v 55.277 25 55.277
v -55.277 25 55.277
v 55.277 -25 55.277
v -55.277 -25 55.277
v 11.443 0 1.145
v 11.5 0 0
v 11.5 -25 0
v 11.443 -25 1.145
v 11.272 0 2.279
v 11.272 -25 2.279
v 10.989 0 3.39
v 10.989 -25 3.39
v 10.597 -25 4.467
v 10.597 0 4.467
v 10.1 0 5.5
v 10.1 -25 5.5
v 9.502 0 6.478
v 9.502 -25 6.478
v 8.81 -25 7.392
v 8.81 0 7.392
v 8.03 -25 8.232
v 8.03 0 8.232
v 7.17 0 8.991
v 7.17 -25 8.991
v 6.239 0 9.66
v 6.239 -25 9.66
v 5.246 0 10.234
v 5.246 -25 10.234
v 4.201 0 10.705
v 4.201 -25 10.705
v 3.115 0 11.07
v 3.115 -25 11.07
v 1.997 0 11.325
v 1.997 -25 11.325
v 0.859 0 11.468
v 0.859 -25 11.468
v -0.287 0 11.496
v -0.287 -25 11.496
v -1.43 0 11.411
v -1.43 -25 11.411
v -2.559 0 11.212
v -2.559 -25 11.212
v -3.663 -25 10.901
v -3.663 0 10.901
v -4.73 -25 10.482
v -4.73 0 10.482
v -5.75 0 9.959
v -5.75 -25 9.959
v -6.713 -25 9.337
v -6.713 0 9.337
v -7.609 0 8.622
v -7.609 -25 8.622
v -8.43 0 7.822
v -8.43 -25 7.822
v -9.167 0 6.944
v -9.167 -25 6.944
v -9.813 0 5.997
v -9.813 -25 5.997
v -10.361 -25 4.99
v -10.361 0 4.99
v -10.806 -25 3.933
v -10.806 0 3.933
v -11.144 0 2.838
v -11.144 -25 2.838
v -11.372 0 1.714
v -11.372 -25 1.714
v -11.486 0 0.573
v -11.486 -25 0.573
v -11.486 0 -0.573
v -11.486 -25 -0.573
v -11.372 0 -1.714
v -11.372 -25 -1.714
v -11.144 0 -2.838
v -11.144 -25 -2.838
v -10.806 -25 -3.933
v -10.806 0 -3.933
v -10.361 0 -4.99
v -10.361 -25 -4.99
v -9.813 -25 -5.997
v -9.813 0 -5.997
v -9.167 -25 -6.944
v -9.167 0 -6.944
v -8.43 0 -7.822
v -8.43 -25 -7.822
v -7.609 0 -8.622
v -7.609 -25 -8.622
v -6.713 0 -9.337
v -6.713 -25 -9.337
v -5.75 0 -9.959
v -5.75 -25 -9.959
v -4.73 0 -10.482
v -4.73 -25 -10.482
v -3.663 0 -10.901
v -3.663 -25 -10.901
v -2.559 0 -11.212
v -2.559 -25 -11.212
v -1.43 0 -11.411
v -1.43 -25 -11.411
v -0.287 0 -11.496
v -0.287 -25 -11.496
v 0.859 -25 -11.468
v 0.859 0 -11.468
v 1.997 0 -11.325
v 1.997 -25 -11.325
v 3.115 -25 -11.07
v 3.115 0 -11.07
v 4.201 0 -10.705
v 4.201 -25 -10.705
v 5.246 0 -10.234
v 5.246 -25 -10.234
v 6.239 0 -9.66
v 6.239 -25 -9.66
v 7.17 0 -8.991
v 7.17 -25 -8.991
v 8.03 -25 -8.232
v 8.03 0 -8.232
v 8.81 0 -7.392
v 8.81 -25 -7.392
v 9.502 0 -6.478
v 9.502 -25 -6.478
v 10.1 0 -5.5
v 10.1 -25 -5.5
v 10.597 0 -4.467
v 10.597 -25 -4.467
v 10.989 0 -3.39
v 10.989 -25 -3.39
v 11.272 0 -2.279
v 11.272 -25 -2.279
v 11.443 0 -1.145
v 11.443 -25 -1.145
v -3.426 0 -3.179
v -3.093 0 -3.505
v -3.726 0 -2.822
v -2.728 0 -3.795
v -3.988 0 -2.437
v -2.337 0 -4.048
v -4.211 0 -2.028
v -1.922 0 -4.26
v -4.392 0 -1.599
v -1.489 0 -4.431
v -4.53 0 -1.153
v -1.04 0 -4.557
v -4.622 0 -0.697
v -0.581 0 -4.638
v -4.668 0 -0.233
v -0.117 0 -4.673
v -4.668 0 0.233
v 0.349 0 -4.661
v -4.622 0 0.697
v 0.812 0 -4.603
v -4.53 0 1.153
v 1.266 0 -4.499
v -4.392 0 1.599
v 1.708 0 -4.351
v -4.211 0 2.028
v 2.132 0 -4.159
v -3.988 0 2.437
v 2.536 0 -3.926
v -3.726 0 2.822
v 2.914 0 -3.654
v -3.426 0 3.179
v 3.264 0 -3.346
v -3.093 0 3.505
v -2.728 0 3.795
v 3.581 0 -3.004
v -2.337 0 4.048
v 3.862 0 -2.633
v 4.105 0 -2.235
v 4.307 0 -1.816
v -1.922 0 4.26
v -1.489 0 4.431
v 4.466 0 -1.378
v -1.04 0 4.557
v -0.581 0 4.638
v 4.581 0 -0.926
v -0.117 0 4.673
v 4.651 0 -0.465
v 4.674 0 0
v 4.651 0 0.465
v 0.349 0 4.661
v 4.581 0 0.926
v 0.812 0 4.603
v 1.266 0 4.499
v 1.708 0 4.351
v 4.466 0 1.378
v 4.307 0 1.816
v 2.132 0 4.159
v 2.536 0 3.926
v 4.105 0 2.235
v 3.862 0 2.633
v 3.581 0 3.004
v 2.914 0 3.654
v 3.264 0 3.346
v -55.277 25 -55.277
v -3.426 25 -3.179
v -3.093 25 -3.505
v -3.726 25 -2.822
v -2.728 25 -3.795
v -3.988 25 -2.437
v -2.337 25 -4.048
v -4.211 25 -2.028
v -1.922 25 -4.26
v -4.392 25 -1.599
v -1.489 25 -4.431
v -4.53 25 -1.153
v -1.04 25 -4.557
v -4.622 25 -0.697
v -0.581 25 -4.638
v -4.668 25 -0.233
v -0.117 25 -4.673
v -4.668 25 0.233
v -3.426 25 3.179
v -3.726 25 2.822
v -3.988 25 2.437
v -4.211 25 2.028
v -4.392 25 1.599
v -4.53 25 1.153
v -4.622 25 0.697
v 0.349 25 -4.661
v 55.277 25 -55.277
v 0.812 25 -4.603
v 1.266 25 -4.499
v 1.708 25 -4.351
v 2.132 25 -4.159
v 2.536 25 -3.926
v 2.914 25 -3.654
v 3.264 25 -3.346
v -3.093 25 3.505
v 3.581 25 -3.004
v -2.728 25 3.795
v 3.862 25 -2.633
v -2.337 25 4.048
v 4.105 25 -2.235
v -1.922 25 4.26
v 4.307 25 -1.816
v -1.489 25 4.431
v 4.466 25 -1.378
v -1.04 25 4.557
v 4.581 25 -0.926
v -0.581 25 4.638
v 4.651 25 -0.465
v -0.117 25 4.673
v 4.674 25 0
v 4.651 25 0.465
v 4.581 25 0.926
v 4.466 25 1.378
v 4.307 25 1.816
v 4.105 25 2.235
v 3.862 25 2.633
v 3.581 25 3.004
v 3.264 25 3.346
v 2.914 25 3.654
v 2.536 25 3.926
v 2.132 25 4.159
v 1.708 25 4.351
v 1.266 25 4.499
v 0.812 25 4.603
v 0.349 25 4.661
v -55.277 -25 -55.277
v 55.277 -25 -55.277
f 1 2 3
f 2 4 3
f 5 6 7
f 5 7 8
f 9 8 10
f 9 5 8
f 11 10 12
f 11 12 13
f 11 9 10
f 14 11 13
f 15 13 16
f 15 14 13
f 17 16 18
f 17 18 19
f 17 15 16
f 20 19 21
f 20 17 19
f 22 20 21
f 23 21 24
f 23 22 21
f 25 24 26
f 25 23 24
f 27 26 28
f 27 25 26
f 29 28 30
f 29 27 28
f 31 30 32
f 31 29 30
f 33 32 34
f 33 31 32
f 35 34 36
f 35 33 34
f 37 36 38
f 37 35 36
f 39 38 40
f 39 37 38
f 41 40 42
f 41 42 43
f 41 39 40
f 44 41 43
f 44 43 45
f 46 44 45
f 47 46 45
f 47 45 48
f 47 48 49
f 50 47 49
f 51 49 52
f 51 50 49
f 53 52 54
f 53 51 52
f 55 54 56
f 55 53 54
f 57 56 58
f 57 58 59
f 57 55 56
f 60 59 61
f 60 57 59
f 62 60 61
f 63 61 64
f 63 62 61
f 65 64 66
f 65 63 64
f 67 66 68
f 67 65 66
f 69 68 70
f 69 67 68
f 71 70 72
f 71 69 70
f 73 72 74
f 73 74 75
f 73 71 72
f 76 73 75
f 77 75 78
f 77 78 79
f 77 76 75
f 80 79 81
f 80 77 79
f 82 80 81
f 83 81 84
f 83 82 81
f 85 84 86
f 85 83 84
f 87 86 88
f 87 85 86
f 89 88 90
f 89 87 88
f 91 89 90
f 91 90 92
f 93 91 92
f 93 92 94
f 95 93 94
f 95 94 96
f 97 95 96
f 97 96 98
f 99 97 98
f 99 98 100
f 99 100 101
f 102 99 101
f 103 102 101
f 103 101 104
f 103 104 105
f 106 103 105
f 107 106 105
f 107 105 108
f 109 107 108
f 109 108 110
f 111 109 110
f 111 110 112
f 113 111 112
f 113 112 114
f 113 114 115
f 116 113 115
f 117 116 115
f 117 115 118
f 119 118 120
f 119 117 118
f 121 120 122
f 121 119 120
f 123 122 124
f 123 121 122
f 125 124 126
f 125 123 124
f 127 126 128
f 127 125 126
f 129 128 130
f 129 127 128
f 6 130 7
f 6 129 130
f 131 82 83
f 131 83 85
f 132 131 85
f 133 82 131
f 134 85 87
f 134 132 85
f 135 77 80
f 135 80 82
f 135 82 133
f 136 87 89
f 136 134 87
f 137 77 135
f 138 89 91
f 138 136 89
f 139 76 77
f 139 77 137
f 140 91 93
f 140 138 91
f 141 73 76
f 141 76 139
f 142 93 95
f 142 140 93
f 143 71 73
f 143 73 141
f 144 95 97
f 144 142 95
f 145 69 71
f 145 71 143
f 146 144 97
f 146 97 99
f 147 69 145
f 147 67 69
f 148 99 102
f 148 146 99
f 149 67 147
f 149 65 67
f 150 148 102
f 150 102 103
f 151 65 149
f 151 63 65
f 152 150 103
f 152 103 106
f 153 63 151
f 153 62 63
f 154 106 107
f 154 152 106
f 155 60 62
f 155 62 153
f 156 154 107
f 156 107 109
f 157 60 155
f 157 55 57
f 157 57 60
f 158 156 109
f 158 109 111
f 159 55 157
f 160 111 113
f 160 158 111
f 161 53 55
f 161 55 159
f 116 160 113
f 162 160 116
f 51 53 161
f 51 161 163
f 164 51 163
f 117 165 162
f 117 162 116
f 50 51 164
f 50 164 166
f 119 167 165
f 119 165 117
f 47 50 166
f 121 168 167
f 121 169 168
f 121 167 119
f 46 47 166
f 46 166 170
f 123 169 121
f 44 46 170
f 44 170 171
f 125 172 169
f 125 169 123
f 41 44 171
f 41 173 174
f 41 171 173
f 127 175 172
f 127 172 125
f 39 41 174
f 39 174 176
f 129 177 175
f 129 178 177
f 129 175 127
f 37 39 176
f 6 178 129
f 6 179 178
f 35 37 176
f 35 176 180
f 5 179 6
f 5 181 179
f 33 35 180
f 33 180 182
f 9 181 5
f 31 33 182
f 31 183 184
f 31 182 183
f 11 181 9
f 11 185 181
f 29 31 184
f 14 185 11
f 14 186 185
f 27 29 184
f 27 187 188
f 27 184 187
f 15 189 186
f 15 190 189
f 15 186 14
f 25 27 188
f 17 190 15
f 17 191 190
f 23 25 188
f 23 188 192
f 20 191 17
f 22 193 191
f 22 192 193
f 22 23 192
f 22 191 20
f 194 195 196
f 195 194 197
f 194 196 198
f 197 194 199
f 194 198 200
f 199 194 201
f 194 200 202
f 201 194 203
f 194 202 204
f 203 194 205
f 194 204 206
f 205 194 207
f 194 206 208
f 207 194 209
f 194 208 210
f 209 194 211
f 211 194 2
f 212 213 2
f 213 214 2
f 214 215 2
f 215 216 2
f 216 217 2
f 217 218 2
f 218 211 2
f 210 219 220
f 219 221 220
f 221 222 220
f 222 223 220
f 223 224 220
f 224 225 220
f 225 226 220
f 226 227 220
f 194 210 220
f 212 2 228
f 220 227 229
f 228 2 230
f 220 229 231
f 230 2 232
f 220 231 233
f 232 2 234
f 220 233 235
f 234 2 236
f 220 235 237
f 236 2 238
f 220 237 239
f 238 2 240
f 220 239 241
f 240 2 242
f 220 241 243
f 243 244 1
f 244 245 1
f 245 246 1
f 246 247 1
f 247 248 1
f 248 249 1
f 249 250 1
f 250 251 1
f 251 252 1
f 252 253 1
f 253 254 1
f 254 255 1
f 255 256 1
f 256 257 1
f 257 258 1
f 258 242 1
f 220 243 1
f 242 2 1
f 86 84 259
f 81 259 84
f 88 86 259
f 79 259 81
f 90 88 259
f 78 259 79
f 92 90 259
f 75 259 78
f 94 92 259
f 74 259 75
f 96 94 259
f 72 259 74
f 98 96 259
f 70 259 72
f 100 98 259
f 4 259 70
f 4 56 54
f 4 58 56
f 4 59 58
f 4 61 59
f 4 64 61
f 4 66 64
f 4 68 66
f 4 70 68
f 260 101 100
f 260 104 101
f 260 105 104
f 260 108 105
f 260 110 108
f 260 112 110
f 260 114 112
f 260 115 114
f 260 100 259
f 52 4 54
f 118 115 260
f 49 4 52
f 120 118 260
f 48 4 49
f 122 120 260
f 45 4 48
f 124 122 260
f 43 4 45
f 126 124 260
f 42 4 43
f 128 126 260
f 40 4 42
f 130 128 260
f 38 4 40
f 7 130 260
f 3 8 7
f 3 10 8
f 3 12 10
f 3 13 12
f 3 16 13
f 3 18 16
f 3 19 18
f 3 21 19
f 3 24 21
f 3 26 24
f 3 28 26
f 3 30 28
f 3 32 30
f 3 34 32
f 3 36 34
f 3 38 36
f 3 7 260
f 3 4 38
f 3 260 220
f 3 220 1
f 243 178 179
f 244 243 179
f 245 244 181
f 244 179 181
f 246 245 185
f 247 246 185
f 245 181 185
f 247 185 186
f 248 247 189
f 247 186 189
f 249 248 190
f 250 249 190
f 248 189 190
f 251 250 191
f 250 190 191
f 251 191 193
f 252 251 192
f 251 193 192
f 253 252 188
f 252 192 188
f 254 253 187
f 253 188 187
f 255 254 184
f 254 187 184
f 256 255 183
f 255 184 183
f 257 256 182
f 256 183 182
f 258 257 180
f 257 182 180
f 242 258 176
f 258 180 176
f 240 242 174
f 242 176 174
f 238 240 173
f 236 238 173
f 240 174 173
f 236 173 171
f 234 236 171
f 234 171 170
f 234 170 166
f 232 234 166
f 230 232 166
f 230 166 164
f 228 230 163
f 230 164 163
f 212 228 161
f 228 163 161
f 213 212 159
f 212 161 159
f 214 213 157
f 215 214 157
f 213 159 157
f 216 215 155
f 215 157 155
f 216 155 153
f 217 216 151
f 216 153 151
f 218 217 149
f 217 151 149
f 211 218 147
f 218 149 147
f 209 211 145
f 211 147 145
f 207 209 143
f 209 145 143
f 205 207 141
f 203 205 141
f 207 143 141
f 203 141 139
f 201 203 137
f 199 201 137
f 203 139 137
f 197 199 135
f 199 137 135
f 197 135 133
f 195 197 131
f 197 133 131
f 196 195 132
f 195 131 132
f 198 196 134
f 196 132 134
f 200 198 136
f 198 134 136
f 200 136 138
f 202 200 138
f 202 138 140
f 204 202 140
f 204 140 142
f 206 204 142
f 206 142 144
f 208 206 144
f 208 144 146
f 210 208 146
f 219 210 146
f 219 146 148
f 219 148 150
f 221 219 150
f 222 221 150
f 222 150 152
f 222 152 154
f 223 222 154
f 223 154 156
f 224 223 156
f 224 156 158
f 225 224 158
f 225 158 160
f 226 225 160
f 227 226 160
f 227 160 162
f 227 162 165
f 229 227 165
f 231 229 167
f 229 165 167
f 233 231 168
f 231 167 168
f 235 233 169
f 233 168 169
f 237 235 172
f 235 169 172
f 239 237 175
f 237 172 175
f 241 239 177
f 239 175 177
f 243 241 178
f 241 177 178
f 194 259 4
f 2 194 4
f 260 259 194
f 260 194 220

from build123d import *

# Parameters (mm, degrees)
F0_W     = 110.554024
F0_H     = 110.554024
F1_DEPTH = 25
F2_R     = 11.5
F3_DEPTH = 25
F4_R     = 4.674091
F5_DEPTH = 25


with BuildPart() as f1:
    # F0 (on Front) → F1 (new body, symmetric)
    with BuildSketch(Plane.XZ):
        Rectangle(F0_W, F0_H)
    extrude(amount=F1_DEPTH, both=True)

    # F2 (on Front) → F3 (cut, through all)
    with BuildSketch(Plane.XZ):
        Circle(F2_R)
    extrude(amount=F3_DEPTH, mode=Mode.SUBTRACT)

    # F4 (on face) → F5 (cut, through all)
    with BuildSketch(Plane.XZ):
        Circle(F4_R)
    extrude(amount=-F5_DEPTH, mode=Mode.SUBTRACT)


solid = f1.part
